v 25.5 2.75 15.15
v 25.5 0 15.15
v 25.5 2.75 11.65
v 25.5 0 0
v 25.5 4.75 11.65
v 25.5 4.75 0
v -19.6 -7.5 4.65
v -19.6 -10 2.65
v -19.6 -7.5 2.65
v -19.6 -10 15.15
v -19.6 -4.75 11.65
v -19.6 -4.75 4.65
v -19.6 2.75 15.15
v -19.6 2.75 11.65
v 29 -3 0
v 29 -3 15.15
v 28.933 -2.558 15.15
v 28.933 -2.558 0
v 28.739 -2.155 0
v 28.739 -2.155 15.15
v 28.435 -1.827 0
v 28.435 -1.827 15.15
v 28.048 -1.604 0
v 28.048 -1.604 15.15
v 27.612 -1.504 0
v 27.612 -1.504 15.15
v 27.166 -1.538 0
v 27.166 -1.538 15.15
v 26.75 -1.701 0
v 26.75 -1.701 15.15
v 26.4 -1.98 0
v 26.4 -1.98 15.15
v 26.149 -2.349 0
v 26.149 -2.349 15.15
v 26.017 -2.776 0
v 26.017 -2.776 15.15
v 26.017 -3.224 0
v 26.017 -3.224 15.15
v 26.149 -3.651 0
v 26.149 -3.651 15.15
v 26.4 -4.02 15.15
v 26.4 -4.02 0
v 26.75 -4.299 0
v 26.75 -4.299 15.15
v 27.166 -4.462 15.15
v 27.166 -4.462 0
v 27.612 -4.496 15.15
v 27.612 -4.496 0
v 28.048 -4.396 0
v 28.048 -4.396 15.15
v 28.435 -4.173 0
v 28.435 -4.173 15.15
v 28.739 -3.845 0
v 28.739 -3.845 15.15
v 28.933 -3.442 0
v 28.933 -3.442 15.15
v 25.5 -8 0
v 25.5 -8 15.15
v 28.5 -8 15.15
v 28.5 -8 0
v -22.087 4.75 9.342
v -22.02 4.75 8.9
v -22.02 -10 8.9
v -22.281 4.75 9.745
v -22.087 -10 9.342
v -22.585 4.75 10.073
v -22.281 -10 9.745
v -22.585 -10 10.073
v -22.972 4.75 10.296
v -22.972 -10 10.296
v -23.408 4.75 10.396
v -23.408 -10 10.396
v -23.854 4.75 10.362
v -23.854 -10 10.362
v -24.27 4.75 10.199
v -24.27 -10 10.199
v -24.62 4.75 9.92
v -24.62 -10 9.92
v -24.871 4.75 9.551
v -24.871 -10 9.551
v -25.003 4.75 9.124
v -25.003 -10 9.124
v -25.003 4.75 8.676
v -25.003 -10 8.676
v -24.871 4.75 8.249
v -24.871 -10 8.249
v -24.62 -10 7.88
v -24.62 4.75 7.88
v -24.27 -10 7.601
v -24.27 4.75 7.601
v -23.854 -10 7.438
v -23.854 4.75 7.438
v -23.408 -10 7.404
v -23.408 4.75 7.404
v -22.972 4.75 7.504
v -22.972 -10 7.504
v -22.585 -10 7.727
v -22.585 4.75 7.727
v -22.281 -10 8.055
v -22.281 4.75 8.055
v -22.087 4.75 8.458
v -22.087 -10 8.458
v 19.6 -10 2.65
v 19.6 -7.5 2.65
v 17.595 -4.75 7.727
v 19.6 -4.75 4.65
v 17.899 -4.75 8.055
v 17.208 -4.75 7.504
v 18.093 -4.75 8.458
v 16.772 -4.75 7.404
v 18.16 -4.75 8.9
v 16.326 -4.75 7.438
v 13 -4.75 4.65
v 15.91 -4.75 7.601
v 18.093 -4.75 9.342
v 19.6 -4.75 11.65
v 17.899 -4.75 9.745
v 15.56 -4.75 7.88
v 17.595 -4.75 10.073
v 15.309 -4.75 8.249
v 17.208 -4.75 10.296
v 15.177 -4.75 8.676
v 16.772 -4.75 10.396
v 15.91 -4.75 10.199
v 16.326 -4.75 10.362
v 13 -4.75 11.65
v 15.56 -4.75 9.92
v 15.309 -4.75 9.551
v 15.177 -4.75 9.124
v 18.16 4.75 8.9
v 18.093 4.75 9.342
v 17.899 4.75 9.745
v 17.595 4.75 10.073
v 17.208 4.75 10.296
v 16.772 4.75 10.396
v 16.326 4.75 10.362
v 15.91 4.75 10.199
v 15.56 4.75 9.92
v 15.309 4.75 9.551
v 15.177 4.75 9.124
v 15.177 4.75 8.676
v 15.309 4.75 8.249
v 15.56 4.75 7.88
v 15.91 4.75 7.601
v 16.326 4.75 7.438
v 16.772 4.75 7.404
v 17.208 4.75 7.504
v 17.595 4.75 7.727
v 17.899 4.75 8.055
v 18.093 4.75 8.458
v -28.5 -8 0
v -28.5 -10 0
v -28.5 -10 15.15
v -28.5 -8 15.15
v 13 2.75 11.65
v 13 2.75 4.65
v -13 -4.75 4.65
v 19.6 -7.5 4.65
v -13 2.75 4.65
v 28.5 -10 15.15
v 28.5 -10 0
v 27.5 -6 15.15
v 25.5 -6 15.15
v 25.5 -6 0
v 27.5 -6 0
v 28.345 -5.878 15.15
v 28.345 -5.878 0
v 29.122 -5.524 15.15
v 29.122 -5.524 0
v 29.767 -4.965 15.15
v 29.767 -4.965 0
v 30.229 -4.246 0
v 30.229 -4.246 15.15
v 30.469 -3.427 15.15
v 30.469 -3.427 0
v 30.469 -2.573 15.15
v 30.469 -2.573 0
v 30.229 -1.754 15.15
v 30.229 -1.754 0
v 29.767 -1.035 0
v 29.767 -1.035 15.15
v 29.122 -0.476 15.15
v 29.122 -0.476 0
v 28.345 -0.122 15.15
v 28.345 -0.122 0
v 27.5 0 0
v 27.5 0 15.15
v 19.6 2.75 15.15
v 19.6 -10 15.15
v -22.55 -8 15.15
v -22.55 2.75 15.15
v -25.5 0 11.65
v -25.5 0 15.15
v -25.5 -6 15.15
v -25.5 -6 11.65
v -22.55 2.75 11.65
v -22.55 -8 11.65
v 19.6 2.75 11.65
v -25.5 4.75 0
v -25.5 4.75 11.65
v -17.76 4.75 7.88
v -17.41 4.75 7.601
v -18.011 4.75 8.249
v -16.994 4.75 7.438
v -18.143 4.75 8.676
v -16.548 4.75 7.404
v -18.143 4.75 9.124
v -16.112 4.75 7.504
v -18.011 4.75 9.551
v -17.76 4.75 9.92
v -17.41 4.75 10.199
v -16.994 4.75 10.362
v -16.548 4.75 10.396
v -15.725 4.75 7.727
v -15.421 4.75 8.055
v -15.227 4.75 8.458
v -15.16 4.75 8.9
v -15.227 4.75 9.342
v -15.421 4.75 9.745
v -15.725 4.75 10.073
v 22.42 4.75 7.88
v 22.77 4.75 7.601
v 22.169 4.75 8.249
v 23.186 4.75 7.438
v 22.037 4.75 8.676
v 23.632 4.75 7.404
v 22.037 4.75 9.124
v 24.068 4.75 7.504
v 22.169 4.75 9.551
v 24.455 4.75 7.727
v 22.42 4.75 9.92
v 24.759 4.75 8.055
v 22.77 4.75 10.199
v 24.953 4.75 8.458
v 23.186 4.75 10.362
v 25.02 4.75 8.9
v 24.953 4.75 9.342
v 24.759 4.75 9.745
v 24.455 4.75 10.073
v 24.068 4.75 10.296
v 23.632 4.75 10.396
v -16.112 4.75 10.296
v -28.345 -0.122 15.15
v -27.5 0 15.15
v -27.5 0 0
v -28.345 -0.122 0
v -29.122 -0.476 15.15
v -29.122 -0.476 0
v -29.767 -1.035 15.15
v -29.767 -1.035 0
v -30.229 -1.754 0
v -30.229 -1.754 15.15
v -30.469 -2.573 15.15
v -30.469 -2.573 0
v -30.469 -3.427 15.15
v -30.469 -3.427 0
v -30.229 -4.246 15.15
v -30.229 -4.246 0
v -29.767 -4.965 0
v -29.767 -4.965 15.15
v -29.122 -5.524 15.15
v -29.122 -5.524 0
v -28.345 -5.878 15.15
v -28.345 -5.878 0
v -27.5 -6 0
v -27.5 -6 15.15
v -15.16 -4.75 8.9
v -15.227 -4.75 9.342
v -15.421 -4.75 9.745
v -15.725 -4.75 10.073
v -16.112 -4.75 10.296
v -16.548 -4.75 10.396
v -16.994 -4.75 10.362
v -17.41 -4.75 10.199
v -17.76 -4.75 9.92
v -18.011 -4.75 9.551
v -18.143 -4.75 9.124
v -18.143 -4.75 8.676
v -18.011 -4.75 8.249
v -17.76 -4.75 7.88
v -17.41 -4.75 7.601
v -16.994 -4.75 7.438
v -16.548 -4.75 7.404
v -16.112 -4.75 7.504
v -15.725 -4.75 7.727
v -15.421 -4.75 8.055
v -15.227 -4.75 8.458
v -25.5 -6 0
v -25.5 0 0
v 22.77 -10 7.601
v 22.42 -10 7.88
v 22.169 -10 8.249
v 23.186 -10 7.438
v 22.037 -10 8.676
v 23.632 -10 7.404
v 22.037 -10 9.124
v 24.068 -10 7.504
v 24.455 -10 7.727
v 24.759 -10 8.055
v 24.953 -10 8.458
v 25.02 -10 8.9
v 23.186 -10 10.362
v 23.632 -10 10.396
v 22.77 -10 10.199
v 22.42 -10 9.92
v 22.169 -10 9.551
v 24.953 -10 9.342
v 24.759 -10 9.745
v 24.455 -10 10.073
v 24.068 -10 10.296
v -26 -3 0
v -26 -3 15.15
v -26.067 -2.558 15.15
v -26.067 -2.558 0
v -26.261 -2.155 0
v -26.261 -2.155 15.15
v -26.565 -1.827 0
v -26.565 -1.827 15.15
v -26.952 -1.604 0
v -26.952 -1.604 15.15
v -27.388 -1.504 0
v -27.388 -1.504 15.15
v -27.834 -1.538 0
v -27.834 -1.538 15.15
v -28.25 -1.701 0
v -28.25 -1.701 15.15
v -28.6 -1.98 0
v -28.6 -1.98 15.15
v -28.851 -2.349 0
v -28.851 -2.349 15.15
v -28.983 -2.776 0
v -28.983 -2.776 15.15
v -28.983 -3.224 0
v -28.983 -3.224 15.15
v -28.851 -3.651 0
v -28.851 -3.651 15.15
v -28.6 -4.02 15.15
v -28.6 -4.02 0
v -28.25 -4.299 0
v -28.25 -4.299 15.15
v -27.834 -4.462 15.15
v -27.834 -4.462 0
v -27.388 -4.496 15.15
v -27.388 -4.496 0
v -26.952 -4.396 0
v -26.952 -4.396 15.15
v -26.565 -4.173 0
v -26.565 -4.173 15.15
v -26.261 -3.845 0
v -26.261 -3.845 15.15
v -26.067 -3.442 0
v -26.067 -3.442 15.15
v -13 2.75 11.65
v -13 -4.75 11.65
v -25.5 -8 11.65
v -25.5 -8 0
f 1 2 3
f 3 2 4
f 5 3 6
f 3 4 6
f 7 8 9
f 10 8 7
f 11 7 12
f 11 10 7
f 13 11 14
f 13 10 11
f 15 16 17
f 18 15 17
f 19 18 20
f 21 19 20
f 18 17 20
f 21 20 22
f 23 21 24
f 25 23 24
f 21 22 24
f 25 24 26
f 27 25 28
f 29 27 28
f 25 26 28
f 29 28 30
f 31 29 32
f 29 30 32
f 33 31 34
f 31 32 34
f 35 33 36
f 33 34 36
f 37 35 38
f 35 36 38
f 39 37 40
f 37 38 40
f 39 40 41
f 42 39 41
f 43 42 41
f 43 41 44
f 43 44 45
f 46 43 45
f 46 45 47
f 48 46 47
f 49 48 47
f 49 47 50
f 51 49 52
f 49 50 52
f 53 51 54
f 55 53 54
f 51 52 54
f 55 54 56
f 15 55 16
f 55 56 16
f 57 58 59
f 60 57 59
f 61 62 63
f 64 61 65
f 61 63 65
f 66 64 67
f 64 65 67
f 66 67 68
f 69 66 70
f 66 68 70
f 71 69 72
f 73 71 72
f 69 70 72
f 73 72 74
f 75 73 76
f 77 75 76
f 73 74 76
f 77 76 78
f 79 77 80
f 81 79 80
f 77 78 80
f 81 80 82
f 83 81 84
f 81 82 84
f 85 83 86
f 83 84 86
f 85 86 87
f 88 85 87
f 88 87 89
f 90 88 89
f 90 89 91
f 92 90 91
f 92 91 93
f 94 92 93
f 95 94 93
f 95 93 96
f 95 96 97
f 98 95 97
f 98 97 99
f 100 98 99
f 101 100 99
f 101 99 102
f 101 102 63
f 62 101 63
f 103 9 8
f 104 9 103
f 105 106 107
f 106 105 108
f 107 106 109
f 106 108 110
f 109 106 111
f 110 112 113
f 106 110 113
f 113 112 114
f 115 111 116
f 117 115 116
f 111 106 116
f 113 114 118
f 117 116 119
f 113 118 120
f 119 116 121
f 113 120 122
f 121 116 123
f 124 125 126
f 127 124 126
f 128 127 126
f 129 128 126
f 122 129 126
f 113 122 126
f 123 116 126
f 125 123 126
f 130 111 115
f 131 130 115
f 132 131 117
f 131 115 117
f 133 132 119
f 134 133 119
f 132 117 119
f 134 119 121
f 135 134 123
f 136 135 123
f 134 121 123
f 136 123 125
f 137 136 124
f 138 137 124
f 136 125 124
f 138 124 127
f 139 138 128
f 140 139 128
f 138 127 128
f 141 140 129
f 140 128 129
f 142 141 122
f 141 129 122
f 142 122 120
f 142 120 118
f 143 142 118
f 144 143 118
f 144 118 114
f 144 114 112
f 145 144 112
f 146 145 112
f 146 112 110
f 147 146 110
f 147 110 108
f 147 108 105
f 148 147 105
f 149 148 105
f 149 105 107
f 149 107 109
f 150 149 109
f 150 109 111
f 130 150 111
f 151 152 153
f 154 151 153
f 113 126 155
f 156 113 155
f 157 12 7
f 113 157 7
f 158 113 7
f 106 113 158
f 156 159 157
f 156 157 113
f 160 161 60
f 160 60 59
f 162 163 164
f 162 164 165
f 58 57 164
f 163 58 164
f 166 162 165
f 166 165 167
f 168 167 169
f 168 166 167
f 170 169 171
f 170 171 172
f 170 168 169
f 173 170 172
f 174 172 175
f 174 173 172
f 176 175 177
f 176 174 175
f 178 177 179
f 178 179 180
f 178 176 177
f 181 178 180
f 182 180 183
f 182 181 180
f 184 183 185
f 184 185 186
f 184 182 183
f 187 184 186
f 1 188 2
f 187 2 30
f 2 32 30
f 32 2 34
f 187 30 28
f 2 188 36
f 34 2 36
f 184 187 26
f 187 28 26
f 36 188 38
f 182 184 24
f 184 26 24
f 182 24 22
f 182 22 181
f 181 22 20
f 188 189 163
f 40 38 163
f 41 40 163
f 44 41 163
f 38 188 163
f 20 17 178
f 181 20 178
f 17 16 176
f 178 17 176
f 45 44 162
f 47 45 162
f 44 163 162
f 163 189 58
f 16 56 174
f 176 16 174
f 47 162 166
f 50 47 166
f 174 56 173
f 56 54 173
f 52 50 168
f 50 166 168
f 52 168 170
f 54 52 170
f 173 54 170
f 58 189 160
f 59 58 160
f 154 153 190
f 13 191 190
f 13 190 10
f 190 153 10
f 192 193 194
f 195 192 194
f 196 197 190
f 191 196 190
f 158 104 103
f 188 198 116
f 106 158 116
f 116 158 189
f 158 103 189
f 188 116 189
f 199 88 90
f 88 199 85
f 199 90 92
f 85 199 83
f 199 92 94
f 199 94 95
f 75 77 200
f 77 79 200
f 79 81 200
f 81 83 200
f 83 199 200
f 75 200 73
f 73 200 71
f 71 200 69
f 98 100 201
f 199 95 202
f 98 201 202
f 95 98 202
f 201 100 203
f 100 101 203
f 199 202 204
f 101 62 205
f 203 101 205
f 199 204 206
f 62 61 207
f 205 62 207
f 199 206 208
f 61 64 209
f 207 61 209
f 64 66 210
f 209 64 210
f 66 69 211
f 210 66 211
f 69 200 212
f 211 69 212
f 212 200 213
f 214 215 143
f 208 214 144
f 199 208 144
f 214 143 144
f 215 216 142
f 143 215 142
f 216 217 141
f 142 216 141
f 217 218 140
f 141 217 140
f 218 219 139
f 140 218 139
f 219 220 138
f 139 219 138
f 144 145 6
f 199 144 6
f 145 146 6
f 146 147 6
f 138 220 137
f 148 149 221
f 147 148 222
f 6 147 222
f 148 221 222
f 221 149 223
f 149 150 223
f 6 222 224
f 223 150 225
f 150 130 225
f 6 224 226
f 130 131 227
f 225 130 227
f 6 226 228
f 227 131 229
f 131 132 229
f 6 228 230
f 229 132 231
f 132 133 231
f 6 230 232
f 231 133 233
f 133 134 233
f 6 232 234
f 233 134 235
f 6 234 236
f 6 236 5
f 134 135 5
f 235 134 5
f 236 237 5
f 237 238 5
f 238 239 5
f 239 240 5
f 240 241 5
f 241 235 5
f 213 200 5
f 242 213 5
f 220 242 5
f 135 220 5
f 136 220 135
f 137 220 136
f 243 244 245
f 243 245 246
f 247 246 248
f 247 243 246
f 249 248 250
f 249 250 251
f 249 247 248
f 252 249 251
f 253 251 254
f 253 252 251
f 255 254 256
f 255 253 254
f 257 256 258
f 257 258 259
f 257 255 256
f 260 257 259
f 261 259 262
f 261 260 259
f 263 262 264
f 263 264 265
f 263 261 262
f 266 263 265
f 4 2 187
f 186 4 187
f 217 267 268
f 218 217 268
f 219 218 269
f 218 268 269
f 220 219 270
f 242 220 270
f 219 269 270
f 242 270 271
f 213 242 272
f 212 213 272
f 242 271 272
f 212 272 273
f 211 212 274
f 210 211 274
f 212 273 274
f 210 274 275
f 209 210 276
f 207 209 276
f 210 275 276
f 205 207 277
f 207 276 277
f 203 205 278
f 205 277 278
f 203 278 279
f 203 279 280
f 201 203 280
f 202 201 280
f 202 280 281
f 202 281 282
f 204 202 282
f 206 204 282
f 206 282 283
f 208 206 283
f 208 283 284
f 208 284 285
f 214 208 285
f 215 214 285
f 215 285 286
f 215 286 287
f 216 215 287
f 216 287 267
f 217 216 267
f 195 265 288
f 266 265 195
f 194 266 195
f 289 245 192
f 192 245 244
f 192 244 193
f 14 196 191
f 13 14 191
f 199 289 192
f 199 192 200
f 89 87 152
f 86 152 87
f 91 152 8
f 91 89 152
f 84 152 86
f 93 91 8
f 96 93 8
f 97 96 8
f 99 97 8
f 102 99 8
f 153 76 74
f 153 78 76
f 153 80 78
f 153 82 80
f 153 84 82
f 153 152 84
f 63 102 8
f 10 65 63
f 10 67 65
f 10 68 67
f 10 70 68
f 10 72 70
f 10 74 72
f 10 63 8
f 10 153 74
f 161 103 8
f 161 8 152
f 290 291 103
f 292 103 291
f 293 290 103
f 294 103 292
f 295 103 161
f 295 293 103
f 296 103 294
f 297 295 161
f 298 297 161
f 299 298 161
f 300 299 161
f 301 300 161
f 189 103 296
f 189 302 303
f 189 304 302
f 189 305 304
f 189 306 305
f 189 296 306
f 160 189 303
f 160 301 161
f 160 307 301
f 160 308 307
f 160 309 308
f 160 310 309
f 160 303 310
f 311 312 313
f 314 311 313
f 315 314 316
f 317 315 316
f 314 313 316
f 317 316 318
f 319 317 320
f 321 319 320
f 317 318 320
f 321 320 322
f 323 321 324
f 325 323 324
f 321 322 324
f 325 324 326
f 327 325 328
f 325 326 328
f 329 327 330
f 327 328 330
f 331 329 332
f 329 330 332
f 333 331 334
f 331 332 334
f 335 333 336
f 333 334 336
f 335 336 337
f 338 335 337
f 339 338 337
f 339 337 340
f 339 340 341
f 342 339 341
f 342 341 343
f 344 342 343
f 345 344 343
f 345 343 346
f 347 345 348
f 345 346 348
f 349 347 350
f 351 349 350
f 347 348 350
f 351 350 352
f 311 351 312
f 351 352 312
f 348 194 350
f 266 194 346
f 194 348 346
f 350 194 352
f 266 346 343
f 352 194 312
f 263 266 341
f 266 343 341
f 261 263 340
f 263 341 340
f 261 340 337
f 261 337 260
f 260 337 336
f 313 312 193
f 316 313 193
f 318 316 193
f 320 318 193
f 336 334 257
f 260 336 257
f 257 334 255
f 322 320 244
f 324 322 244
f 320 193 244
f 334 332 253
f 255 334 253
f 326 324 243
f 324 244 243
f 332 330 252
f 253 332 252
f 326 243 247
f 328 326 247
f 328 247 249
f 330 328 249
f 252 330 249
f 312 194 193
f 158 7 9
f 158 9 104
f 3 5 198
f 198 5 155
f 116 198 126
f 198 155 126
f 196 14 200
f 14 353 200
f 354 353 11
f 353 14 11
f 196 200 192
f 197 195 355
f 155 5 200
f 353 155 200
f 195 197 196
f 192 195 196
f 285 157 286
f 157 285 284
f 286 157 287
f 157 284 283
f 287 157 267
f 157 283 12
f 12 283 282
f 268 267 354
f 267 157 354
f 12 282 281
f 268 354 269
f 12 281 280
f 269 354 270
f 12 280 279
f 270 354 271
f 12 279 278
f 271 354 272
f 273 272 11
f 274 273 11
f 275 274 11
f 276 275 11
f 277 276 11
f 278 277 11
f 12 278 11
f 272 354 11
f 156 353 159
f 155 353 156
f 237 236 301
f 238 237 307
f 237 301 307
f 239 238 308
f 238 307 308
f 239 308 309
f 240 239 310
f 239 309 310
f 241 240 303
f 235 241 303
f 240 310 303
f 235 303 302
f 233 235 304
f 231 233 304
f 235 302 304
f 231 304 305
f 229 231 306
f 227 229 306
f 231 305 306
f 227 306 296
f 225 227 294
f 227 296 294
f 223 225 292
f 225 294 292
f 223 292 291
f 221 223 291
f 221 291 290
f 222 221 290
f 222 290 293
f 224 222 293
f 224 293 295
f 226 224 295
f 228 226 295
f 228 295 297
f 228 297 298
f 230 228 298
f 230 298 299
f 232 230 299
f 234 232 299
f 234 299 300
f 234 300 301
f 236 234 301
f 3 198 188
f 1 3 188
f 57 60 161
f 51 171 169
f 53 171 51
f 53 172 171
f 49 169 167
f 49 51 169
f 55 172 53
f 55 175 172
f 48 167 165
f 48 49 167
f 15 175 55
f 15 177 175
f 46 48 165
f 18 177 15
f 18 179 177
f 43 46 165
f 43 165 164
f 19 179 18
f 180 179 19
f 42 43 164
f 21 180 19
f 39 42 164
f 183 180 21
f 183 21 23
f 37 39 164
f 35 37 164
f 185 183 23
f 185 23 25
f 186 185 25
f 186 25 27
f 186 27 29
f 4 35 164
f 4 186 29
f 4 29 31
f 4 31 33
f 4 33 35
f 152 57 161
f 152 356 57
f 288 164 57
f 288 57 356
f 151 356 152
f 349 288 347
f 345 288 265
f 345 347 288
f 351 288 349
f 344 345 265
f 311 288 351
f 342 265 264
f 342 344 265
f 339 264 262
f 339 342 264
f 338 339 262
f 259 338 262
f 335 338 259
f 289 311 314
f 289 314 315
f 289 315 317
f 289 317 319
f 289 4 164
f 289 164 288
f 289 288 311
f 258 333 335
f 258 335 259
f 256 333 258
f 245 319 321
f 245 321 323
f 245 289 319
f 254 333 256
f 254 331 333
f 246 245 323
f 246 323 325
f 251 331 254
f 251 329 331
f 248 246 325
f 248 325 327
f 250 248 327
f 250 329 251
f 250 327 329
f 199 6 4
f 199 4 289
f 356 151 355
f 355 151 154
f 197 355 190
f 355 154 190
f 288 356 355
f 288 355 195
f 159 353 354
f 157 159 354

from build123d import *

# Parameters (mm, degrees)
SKETCH_W        = 51
SKETCH_H        = 20
PAD_DEPTH       = 15.15
POCKET_DEPTH    = 10.5
SKETCH002_W     = 39.2
SKETCH002_H     = 2.5
POCKET001_DEPTH = 2
SKETCH011_W     = 51
SKETCH011_H     = 5.25
POCKET002_DEPTH = 15.151
SKETCH012_W     = 3
SKETCH012_H     = 15.15
PAD005_DEPTH    = 2
SKETCH013_R     = 1.5
POCKET003_DEPTH = 14.751
SKETCH014_W     = 39.2
SKETCH014_H     = 3.5
POCKET004_DEPTH = 7.5
SKETCH015_W     = 2
SKETCH015_H     = 3.5
POCKET005_DEPTH = 54.001
SKETCH016_W     = 2.95
SKETCH016_H     = 3.5
POCKET006_DEPTH = 10.75
SKETCH017_R     = 1.5
PAD006_DEPTH    = 15.15


with BuildPart() as part:
    # Sketch → Pad (new body)
    with BuildSketch(Plane.XY):
        Rectangle(SKETCH_W, SKETCH_H)
    extrude(amount=PAD_DEPTH)

    # Sketch001 (on Face6 of Pad) → Pocket (cut)
    with BuildSketch(Plane.XY.offset(15.15)):
        Polygon((-19.6, -10), (19.6, -10), (19.6, -4.75), (13, -4.75), (13, 2.75), (-13, 2.75), (-13, -4.75), (-19.6, -4.75), align=None)
    extrude(amount=-POCKET_DEPTH, mode=Mode.SUBTRACT)

    # Sketch002 (on Face14 of Pocket) → Pocket001 (cut)
    with BuildSketch(Plane.XY.offset(4.65)):
        with Locations((0, -8.75)):
            Rectangle(SKETCH002_W, SKETCH002_H)
    extrude(amount=-POCKET001_DEPTH, mode=Mode.SUBTRACT)

    # Sketch011 (on Face5 of Pocket001) → Pocket002 (cut, through all)
    with BuildSketch(Plane.XY.offset(15.15)):
        with Locations((0, 7.375)):
            Rectangle(SKETCH011_W, SKETCH011_H)
    extrude(amount=-POCKET002_DEPTH, mode=Mode.SUBTRACT)

    # Sketch012 (on Face5 of Pocket002) → Pad005 (join)
    with BuildSketch(Plane.XZ.offset(10)):
        with Locations((-27, 7.575)):
            Rectangle(SKETCH012_W, SKETCH012_H)
        with Locations((27, 7.575)):
            Rectangle(SKETCH012_W, SKETCH012_H)
    extrude(amount=-PAD005_DEPTH)

    # Sketch013 (on Face8 of Pad005) → Pocket003 (cut, through all)
    with BuildSketch(Plane.XZ.offset(10)):
        with Locations((-23.52, 8.9)):
            Circle(SKETCH013_R)
        with Locations((-16.66, 8.9)):
            Circle(SKETCH013_R)
        with Locations((16.66, 8.9)):
            Circle(SKETCH013_R)
        with Locations((23.52, 8.9)):
            Circle(SKETCH013_R)
    extrude(amount=-POCKET003_DEPTH, mode=Mode.SUBTRACT)

    # Sketch014 (on Face20 of Pocket003) → Pocket004 (cut)
    with BuildSketch(Plane.XZ.offset(4.75)):
        with Locations((0, 13.4)):
            Rectangle(SKETCH014_W, SKETCH014_H)
    extrude(amount=-POCKET004_DEPTH, mode=Mode.SUBTRACT)

    # Sketch015 (on Face1 of Pocket004) → Pocket005 (cut, through all)
    with BuildSketch(Plane(origin=(-25.5, 0, 0), x_dir=(0, -1, 0), z_dir=(-1, 0, 0))):
        with Locations((-3.75, 13.4)):
            Rectangle(SKETCH015_W, SKETCH015_H)
    extrude(amount=-POCKET005_DEPTH, mode=Mode.SUBTRACT)

    # Sketch016 (on Face5 of Pocket005) → Pocket006 (cut)
    with BuildSketch(Plane(origin=(0, 2.75, 0), x_dir=(-1, 0, 0), z_dir=(0, 1, 0))):
        with Locations((24.025, 13.4)):
            Rectangle(SKETCH016_W, SKETCH016_H)
    extrude(amount=-POCKET006_DEPTH, mode=Mode.SUBTRACT)

    # Sketch017 (on Face25 of Pocket006) → Pad006 (join)
    with BuildSketch(Plane.XY.offset(15.15)):
        with BuildLine():
            Line((-25.5, 0), (-25.5, -6))
            Line((-27.5, -6), (-25.5, -6))
            ThreePointArc((-27.5, 0), (-30.5, -3), (-27.5, -6))
            Line((-27.5, 0), (-25.5, 0))
        make_face()
        with Locations((-27.5, -3)):
            Circle(SKETCH017_R, mode=Mode.SUBTRACT)
        with BuildLine():
            Line((25.5, 0), (25.5, -6))
            Line((25.5, -6), (27.5, -6))
            ThreePointArc((27.5, -6), (30.5, -3), (27.5, 0))
            Line((25.5, 0), (27.5, 0))
        make_face()
        with Locations((27.5, -3)):
            Circle(SKETCH017_R, mode=Mode.SUBTRACT)
    extrude(amount=-PAD006_DEPTH)


solid = part.part
